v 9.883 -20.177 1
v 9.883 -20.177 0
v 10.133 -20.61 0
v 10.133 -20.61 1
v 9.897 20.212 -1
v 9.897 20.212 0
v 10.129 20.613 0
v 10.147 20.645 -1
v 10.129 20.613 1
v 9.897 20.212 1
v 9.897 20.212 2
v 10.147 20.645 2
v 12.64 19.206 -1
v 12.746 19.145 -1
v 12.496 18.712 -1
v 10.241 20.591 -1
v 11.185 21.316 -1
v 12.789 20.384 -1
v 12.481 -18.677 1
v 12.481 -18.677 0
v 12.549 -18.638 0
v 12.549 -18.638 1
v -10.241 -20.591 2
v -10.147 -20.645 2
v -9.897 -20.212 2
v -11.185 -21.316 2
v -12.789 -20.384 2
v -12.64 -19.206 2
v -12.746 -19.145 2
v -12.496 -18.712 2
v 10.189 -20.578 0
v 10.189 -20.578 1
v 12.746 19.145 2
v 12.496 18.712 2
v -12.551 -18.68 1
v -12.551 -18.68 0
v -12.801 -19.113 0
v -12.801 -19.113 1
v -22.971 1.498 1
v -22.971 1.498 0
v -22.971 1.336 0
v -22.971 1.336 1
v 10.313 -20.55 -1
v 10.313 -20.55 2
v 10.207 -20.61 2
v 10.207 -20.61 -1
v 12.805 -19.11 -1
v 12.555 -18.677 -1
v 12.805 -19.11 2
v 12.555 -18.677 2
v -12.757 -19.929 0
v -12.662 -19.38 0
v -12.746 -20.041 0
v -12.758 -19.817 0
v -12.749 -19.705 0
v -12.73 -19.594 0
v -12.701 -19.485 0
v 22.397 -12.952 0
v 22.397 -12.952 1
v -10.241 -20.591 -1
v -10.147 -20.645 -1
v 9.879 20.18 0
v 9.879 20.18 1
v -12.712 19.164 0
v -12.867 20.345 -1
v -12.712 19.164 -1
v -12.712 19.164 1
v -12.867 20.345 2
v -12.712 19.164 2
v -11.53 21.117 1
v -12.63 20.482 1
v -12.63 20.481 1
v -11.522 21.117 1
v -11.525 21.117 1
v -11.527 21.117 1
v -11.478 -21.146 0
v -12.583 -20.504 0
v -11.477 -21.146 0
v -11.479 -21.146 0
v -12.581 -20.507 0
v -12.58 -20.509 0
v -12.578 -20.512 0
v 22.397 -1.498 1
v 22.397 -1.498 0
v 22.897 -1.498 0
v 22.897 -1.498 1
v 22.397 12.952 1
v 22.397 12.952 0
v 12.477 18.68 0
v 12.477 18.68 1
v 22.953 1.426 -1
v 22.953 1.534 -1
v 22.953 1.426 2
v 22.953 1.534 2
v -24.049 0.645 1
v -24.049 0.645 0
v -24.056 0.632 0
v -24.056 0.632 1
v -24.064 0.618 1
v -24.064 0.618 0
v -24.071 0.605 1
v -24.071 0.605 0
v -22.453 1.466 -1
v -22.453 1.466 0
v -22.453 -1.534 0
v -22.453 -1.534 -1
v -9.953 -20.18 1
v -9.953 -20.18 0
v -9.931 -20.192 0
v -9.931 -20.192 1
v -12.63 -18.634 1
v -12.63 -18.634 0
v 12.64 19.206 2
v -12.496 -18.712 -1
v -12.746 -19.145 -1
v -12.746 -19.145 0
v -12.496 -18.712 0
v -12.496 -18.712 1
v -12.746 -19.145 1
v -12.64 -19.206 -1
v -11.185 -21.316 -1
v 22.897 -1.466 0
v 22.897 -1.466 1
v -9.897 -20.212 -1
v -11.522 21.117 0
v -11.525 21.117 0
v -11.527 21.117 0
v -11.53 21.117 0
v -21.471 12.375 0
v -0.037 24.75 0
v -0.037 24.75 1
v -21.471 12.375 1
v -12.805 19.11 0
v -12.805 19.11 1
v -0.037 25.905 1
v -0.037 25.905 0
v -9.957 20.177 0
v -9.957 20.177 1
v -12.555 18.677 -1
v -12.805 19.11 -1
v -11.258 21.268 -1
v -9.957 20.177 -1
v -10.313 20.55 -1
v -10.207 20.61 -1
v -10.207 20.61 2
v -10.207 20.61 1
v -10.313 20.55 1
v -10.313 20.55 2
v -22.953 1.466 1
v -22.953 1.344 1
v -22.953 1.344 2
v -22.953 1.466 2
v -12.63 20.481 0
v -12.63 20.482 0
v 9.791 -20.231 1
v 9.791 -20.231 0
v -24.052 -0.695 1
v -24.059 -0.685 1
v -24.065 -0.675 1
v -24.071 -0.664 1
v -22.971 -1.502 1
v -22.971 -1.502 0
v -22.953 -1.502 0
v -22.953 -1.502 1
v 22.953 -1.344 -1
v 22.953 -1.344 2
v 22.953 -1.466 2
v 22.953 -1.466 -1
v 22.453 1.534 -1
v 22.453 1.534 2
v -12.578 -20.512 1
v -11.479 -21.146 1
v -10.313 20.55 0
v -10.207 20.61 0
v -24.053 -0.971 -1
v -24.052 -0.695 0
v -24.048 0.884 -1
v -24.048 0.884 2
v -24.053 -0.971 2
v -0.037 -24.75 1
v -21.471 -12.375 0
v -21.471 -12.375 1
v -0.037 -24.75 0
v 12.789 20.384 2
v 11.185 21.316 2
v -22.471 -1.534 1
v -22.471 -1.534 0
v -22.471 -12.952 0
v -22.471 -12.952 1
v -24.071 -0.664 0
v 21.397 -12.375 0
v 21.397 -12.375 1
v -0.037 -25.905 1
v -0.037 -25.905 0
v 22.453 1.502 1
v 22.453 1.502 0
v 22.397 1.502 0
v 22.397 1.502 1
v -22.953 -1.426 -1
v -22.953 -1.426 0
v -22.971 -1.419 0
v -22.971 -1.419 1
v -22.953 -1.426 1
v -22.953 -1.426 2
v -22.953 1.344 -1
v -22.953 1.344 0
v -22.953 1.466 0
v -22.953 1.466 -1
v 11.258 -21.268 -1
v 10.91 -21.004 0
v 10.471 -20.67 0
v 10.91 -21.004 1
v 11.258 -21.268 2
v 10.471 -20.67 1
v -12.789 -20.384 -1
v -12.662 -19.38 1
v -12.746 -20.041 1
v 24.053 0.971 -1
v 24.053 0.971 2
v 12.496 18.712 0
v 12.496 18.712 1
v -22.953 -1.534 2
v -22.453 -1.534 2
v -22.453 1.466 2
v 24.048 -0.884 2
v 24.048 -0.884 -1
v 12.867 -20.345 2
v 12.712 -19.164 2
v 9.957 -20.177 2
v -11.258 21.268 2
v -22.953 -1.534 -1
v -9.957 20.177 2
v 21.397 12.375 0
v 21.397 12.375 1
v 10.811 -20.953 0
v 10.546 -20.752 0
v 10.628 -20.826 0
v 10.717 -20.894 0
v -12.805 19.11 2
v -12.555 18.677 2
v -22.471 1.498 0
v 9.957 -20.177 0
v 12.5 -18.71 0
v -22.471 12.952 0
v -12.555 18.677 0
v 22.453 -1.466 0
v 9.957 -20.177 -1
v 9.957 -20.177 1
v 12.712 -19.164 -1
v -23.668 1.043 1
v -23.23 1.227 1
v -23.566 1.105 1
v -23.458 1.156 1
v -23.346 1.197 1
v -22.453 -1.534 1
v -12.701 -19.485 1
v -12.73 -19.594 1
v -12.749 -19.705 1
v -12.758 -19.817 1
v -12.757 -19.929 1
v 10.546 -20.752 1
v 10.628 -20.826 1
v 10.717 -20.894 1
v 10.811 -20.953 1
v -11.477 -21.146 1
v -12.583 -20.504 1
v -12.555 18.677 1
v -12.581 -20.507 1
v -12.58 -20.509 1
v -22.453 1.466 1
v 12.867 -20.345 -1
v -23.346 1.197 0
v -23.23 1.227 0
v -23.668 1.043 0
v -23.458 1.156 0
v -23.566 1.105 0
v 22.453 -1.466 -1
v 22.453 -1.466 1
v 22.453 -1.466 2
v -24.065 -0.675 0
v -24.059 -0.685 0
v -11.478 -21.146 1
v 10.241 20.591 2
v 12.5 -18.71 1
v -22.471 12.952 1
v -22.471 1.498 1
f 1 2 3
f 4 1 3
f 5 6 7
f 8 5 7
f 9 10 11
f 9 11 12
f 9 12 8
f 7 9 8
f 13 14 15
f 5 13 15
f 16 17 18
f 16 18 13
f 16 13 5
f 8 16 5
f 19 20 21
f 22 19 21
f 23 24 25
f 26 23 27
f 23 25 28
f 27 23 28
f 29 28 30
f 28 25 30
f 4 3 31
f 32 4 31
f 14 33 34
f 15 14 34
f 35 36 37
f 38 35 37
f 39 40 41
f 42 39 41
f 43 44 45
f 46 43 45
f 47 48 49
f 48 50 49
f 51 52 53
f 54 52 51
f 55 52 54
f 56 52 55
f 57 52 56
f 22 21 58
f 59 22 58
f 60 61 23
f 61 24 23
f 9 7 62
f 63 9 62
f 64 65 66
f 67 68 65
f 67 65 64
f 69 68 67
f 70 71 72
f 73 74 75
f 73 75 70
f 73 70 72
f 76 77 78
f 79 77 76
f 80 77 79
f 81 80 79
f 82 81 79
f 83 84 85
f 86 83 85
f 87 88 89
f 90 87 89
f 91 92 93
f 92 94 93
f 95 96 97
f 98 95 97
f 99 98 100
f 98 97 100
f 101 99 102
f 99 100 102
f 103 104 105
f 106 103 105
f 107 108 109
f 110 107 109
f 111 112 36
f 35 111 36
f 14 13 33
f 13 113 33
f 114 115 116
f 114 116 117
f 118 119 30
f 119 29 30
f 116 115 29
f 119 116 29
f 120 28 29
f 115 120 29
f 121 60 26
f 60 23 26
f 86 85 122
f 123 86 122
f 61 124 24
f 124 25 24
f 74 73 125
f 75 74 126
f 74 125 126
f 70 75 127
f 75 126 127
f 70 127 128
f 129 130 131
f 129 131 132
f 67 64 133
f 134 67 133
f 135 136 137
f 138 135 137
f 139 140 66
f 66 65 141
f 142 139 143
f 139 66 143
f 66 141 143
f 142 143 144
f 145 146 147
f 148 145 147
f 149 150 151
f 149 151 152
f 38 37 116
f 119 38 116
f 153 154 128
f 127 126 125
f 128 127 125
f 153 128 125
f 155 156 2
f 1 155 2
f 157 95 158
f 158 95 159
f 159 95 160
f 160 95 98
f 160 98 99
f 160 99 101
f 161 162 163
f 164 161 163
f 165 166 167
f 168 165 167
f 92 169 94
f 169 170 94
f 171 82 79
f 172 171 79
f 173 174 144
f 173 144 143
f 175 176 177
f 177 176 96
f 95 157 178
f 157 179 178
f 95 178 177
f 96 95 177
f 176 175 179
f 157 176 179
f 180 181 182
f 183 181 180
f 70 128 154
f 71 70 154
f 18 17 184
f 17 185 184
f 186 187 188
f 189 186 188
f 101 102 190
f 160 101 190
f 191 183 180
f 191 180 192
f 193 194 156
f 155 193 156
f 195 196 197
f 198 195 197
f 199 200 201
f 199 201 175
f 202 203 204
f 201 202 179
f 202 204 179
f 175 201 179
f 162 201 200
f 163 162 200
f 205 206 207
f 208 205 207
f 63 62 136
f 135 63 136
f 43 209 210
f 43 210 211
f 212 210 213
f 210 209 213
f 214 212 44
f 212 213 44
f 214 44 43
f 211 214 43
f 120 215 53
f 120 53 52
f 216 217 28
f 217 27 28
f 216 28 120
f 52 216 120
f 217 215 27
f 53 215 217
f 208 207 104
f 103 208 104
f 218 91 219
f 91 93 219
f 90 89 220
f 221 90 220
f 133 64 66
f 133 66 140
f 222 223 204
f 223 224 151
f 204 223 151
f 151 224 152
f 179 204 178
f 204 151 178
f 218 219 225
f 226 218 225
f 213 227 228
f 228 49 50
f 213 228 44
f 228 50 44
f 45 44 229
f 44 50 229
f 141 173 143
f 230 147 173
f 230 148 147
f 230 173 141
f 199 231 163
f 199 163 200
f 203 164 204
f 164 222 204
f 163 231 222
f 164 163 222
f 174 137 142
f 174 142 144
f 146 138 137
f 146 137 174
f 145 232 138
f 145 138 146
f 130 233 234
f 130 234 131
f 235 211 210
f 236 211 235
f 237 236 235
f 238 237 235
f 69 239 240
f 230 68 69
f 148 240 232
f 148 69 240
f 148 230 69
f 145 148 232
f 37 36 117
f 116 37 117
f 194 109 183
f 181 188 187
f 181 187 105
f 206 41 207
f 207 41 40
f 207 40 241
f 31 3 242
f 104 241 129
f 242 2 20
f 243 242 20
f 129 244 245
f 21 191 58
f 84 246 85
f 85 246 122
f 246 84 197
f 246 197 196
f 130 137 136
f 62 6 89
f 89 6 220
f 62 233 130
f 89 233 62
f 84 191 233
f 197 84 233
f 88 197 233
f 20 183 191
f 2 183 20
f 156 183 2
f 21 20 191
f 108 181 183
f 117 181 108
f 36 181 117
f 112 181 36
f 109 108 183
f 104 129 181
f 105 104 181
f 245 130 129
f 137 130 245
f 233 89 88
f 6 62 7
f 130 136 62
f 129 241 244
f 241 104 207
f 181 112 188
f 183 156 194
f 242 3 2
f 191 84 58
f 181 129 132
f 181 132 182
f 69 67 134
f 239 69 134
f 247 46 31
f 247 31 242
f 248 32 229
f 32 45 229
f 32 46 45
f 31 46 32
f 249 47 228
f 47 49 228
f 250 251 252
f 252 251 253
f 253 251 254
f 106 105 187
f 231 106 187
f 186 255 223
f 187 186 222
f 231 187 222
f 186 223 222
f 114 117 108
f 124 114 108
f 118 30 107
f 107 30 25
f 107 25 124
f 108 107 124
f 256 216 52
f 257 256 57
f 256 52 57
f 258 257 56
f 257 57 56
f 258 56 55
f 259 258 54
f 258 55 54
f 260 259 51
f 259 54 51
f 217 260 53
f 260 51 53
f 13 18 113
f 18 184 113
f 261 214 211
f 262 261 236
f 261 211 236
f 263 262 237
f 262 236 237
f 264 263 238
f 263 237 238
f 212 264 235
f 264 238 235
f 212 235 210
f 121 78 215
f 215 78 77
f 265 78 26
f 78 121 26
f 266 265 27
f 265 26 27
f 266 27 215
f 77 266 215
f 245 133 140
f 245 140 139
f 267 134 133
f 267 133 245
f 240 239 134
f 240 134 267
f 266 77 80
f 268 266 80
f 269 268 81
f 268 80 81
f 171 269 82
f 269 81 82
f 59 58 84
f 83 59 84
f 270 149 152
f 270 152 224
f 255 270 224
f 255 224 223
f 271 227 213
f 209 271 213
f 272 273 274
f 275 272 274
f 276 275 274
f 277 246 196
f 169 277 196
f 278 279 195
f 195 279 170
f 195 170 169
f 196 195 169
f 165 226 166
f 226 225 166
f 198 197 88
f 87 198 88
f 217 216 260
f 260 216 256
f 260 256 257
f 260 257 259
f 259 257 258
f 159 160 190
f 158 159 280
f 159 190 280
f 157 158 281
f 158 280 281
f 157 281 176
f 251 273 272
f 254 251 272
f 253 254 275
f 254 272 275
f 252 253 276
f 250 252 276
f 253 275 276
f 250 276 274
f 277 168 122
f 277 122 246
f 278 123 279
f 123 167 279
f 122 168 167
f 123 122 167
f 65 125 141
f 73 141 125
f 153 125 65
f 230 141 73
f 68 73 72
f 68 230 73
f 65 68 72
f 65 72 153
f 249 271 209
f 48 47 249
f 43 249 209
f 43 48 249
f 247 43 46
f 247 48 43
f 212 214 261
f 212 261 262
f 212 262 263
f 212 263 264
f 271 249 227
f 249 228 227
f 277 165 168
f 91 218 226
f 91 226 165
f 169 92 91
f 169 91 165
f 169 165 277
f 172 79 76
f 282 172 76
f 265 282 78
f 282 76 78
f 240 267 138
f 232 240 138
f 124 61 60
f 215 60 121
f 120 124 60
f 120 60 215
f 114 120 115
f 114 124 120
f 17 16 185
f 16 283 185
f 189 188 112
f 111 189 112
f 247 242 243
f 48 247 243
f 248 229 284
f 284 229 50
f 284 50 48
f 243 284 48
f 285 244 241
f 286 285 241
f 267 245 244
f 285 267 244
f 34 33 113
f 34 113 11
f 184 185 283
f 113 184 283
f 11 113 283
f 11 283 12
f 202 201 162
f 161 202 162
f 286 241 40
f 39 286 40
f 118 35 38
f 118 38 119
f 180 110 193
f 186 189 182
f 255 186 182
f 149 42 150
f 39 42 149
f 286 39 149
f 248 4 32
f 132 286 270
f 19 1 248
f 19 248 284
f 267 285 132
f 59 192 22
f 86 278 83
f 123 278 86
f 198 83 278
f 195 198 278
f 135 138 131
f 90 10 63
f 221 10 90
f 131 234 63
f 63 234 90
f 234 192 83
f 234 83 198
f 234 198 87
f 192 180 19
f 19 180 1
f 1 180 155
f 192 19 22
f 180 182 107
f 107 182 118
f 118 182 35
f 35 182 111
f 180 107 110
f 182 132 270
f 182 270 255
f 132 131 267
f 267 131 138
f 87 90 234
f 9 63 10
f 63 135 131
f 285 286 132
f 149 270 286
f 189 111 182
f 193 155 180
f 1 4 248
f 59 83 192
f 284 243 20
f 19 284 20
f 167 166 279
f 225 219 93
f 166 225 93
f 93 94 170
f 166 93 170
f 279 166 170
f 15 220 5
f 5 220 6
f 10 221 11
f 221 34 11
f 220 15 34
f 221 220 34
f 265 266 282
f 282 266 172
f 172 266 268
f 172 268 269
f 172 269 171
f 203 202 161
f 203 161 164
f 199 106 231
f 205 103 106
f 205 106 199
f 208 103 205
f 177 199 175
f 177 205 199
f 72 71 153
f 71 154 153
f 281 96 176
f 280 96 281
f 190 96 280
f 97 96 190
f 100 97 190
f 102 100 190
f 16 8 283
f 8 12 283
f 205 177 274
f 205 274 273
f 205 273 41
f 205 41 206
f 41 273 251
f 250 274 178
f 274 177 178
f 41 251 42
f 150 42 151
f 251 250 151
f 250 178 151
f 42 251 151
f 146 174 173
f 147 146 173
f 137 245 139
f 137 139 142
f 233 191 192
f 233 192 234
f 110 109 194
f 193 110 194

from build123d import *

# Parameters (mm, degrees)
BOSS_EXTRUDE1_DEPTH      = 1
BOSS_EXTRUDE2_DEPTH      = 1
BOSS_EXTRUDE2_DEPTH_BACK = 2


with BuildPart() as part:
    # Sketch1 → Boss-Extrude1 (new body)
    with BuildSketch(Plane.XY):
        with BuildLine():
            Line((22.397016434, 12.952378094), (12.476954775, 18.679728363))
            Line((12.476954775, 18.679728363), (12.726954775, 19.112741065))
            Line((12.726954775, 19.112741065), (12.516198987, 19.234420976))
            ThreePointArc((12.516198987, 19.234420976), (12.68450037, 19.874654921), (12.504090028, 20.511582679))
            Line((12.504090028, 20.511582679), (11.404603705, 21.146371403))
            ThreePointArc((11.404603705, 21.146371403), (10.775926893, 20.968706558), (10.316076863, 20.504662076))
            Line((10.316076863, 20.504662076), (10.128878563, 20.612741065))
            Line((10.128878563, 20.612741065), (9.878878563, 20.179728363))
            Line((9.878878563, 20.179728363), (-0.03711231, 25.904728363))
            Line((-0.03711231, 25.904728363), (-9.957173969, 20.177378094))
            Line((-9.957173969, 20.177378094), (-10.207173969, 20.610390796))
            Line((-10.207173969, 20.610390796), (-10.417929757, 20.488710885))
            ThreePointArc((-10.417929757, 20.488710885), (-10.888237926, 20.954581131), (-11.530038716, 21.116805071))
            Line((-11.530038716, 21.116805071), (-12.629525039, 20.482016346))
            ThreePointArc((-12.629525039, 20.482016346), (-12.790001175, 19.848733833), (-12.618051881, 19.218469784))
            Line((-12.618051881, 19.218469784), (-12.80525018, 19.110390796))
            Line((-12.80525018, 19.110390796), (-12.55525018, 18.677378094))
            Line((-12.55525018, 18.677378094), (-22.471241054, 12.952378094))
            Line((-22.471241054, 12.952378094), (-22.471241054, 1.901120277))
            Line((-22.471241054, 1.901120277), (-22.471241054, 1.497677556))
            Line((-22.471241054, 1.497677556), (-22.971241054, 1.497677556))
            Line((-22.971241054, 1.497677556), (-22.971241054, 1.254317734))
            ThreePointArc((-22.971241054, 1.254317734), (-23.609850606, 1.079954035), (-24.071241054, 0.605250217))
            Line((-24.071241054, 0.605250217), (-24.071241054, -0.664327233))
            ThreePointArc((-24.071241054, -0.664327233), (-23.603040378, -1.1199449), (-22.971241054, -1.286164467))
            Line((-22.971241054, -1.286164467), (-22.971241054, -1.502322444))
            Line((-22.971241054, -1.502322444), (-22.471241054, -1.502322444))
            Line((-22.471241054, -1.502322444), (-22.471241054, -1.596383326))
            Line((-22.471241054, -1.596383326), (-22.471241054, -12.952322444))
            Line((-22.471241054, -12.952322444), (-12.630090814, -18.634113185))
            Line((-12.630090814, -18.634113185), (-12.551179395, -18.679672714))
            Line((-12.551179395, -18.679672714), (-12.801179395, -19.112685416))
            Line((-12.801179395, -19.112685416), (-12.590423607, -19.234365326))
            ThreePointArc((-12.590423607, -19.234365326), (-12.758724991, -19.874599271), (-12.578314648, -20.511527029))
            Line((-12.578314648, -20.511527029), (-11.478828325, -21.146315754))
            ThreePointArc((-11.478828325, -21.146315754), (-10.850151513, -20.968650909), (-10.390301483, -20.504606427))
            Line((-10.390301483, -20.504606427), (-10.203103183, -20.612685416))
            Line((-10.203103183, -20.612685416), (-9.953103183, -20.179672714))
            Line((-9.953103183, -20.179672714), (-9.931256757, -20.192285754))
            Line((-9.931256757, -20.192285754), (-0.03711231, -25.904672714))
            Line((-0.03711231, -25.904672714), (9.790701603, -20.230581705))
            Line((9.790701603, -20.230581705), (9.882949349, -20.177322444))
            Line((9.882949349, -20.177322444), (10.132949349, -20.610335146))
            Line((10.132949349, -20.610335146), (10.343705136, -20.488655236))
            ThreePointArc((10.343705136, -20.488655236), (10.814013306, -20.954525482), (11.455814095, -21.116749421))
            Line((11.455814095, -21.116749421), (12.555300419, -20.481960696))
            ThreePointArc((12.555300419, -20.481960696), (12.715776555, -19.848678184), (12.543827261, -19.218414135))
            Line((12.543827261, -19.218414135), (12.73102556, -19.110335146))
            Line((12.73102556, -19.110335146), (12.48102556, -18.677322444))
            Line((12.48102556, -18.677322444), (12.549124227, -18.638005661))
            Line((12.549124227, -18.638005661), (22.397016434, -12.952322444))
            Line((22.397016434, -12.952322444), (22.397016434, -1.497621906))
            Line((22.397016434, -1.497621906), (22.897016434, -1.497621906))
            Line((22.897016434, -1.497621906), (22.897016434, -1.254262085))
            ThreePointArc((22.897016434, -1.254262085), (23.535625986, -1.079898386), (23.997016434, -0.605194567))
            Line((23.997016434, -0.605194567), (23.997016434, 0.664382882))
            ThreePointArc((23.997016434, 0.664382882), (23.528815758, 1.120000549), (22.897016434, 1.286220117))
            Line((22.897016434, 1.286220117), (22.897016434, 1.502378094))
            Line((22.897016434, 1.502378094), (22.397016434, 1.502378094))
            Line((22.397016434, 1.502378094), (22.397016434, 12.952378094))
        make_face()
        Polygon((21.397016434, 12.375027825), (-0.03711231, 24.750027825), (-21.471241054, 12.375027825), (-21.471241054, -12.374972175), (-0.03711231, -24.749972175), (21.397016434, -12.374972175), align=None, mode=Mode.SUBTRACT)
    extrude(amount=BOSS_EXTRUDE1_DEPTH)

    # Sketch2 → Boss-Extrude2 (add, two sides)
    with BuildSketch(Plane.XY.offset(1)) as boss_extrude2_sk:
        Polygon((-12.55525018, 18.677378094), (-9.957173969, 20.177378094), (-10.207173969, 20.610390796), (-10.312551863, 20.54955084), (-11.258459696, 21.268059485), (-12.867222828, 20.344781463), (-12.711651031, 19.16443029), (-12.80525018, 19.110390796), align=None)
        Polygon((11.185486168, 21.315732577), (12.789449955, 20.384141846), (12.640157133, 19.205707311), (12.745535027, 19.144867356), (12.495535027, 18.711854654), (9.897458815, 20.211854654), (10.147458815, 20.644867356), (10.241057965, 20.590827862), align=None)
        Polygon((24.052708996, 0.970951113), (24.047909651, -0.883917639), (22.952708996, -1.343843529), (22.952708996, -1.46552344), (22.452708996, -1.46552344), (22.452708996, 1.53447656), (22.952708996, 1.53447656), (22.952708996, 1.426397572), align=None)
        Polygon((12.867222828, -20.344781463), (11.258459696, -21.268059485), (10.312551863, -20.54955084), (10.207173969, -20.610390796), (9.957173969, -20.177378094), (12.55525018, -18.677378094), (12.80525018, -19.110390796), (12.711651031, -19.16443029), align=None)
        Polygon((-11.185486168, -21.315732577), (-12.789449955, -20.384141846), (-12.640157133, -19.205707311), (-12.745535027, -19.144867356), (-12.495535027, -18.711854654), (-9.897458815, -20.211854654), (-10.147458815, -20.644867356), (-10.241057965, -20.590827862), align=None)
        Polygon((-24.052708996, -0.970951113), (-24.047909651, 0.883917639), (-22.952708996, 1.343843529), (-22.952708996, 1.46552344), (-22.452708996, 1.46552344), (-22.452708996, -1.53447656), (-22.952708996, -1.53447656), (-22.952708996, -1.426397572), align=None)
    extrude(amount=BOSS_EXTRUDE2_DEPTH)
    extrude(boss_extrude2_sk.sketch, amount=-BOSS_EXTRUDE2_DEPTH_BACK)


solid = part.part
